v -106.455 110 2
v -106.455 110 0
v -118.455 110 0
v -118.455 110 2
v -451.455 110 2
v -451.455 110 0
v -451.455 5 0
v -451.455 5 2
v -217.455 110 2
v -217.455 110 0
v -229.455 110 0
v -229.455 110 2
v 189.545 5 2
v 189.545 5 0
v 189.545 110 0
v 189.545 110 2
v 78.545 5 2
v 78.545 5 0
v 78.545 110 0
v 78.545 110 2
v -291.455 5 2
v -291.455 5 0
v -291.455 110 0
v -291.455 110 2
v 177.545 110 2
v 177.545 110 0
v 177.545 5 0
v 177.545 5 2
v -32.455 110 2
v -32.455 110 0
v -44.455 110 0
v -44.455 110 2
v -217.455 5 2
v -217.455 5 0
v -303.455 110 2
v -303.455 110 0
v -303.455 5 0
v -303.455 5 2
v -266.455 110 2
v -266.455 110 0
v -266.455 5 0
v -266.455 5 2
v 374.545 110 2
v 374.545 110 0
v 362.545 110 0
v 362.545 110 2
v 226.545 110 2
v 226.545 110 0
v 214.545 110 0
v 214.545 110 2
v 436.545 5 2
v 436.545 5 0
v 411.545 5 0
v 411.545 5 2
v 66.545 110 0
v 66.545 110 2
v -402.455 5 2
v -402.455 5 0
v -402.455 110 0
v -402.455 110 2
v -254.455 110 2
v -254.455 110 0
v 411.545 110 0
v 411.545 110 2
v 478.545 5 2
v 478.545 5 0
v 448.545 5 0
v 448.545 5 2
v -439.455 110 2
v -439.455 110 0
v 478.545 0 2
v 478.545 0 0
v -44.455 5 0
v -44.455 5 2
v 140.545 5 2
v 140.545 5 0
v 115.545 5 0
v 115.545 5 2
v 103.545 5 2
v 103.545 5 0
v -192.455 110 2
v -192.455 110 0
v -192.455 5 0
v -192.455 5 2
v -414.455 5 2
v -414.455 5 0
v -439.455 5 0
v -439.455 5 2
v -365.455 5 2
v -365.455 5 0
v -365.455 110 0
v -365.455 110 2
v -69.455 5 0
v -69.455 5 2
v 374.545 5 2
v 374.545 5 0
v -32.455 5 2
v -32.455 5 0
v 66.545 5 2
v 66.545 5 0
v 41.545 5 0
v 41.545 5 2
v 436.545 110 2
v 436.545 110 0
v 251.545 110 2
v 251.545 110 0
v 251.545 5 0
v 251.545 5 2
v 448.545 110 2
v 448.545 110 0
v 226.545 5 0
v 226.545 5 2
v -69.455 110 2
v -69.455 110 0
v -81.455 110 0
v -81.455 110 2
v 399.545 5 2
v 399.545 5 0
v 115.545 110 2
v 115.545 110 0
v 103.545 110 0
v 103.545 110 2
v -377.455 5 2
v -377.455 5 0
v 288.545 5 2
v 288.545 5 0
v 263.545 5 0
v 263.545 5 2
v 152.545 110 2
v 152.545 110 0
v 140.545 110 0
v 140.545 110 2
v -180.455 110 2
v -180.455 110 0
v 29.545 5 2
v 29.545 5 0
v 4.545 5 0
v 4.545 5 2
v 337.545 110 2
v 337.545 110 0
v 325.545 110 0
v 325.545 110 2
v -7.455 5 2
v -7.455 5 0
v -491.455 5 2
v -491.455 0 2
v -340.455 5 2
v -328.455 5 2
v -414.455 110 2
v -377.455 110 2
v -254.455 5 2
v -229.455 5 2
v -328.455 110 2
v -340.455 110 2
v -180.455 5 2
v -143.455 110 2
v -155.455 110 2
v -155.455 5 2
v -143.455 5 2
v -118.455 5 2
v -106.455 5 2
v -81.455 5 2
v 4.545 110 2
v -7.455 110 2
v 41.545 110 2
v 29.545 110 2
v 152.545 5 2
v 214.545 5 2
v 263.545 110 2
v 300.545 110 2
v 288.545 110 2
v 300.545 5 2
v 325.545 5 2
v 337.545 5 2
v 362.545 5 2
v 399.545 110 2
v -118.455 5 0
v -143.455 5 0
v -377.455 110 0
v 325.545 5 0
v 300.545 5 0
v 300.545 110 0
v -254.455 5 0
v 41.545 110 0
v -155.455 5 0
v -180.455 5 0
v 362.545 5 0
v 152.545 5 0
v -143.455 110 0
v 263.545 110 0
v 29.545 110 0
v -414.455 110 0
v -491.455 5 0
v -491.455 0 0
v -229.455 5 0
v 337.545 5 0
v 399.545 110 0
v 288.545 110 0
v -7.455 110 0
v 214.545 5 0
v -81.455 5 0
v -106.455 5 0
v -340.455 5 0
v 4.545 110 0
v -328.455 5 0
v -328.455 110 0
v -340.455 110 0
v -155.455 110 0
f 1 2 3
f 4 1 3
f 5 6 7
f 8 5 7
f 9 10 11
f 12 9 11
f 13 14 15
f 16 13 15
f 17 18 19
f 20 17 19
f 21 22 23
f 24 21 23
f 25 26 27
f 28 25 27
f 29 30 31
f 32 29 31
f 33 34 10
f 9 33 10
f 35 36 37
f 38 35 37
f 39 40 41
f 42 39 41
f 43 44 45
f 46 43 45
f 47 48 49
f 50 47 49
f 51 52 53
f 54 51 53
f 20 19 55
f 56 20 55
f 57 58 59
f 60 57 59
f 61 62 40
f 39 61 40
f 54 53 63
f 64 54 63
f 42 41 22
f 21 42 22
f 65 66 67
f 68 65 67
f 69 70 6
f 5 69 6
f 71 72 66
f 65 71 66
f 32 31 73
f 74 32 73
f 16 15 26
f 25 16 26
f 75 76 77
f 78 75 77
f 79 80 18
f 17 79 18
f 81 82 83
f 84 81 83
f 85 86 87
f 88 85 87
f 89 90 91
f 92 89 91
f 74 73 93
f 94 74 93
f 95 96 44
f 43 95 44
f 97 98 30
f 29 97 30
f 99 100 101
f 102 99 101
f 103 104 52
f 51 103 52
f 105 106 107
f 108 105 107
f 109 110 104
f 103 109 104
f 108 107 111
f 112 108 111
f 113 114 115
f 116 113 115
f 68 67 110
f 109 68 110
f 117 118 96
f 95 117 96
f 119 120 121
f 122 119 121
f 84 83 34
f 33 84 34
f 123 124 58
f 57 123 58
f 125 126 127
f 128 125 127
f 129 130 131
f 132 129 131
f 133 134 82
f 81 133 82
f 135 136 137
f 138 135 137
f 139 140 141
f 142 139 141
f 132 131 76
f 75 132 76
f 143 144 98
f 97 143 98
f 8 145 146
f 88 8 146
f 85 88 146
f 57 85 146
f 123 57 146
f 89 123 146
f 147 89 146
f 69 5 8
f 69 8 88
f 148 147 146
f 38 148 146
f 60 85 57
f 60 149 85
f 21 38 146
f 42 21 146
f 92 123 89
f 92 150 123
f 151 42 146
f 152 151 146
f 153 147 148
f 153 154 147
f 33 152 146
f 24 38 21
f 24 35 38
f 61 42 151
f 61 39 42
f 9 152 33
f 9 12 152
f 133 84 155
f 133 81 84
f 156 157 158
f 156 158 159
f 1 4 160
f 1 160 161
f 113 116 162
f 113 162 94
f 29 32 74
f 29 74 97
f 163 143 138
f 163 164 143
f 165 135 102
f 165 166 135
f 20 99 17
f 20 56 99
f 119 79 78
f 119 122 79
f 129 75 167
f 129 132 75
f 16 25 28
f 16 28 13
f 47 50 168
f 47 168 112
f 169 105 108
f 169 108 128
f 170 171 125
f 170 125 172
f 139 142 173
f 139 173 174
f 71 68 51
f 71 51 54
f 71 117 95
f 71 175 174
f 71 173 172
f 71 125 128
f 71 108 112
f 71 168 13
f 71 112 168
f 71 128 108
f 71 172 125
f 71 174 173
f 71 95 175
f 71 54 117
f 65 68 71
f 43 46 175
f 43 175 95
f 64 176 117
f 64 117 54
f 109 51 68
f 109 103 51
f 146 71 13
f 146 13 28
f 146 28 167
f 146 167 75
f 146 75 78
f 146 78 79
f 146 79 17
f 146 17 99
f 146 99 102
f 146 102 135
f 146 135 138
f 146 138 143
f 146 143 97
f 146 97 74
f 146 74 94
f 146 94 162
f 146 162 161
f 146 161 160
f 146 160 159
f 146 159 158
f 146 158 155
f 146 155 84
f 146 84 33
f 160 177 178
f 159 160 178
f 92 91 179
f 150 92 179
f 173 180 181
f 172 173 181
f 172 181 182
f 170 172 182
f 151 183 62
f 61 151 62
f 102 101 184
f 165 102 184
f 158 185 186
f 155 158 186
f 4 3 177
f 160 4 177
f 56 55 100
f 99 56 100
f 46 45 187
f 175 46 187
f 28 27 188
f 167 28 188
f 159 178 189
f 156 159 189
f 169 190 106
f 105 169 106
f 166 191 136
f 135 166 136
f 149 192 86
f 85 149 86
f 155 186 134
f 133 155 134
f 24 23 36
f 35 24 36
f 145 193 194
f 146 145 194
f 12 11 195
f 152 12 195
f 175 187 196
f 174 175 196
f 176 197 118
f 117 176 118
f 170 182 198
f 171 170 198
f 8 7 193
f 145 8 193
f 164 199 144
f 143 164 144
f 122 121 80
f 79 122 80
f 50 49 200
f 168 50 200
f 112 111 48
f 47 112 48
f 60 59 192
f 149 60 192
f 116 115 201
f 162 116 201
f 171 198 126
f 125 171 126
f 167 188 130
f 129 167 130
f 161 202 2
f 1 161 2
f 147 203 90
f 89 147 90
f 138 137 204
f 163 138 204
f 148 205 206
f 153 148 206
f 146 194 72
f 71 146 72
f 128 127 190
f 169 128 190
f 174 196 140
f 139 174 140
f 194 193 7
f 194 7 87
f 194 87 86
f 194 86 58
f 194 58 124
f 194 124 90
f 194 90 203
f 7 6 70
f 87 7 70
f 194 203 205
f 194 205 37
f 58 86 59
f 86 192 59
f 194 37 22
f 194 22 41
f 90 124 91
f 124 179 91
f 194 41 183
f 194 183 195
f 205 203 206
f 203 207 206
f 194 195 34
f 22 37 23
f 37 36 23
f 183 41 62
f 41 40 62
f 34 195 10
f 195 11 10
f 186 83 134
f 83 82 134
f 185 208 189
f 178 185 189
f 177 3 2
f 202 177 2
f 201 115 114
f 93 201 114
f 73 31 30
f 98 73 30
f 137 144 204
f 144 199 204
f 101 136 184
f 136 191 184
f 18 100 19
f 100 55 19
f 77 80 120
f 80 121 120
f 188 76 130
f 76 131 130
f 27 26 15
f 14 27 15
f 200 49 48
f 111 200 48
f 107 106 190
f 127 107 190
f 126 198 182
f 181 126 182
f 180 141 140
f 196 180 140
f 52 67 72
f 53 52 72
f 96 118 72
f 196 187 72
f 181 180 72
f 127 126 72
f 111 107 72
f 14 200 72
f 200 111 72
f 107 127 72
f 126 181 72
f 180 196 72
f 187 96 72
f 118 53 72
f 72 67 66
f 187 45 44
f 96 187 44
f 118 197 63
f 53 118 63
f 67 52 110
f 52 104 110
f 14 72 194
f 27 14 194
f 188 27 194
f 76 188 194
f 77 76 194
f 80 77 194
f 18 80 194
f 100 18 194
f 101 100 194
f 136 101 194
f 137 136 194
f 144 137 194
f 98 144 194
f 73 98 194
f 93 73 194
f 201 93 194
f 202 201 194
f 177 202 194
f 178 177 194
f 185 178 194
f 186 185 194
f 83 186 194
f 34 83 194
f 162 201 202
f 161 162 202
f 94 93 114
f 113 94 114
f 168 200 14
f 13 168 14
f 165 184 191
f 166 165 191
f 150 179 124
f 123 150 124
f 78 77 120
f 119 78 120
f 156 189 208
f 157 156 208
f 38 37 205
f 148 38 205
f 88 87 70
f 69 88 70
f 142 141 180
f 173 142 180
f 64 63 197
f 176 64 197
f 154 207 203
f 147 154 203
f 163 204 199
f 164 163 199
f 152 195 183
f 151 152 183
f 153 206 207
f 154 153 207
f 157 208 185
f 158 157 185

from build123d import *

# Parameters (mm, degrees)
BOSS_EXTRUDE1_DEPTH = 2


with BuildPart() as part:
    # Sketch1 → Boss-Extrude1 (new body)
    with BuildSketch(Plane.XY):
        Polygon((-481.45546786, 0), (478.54453214, 0), (478.54453214, 5), (448.54453214, 5), (448.54453214, 110), (436.54453214, 110), (436.54453214, 5), (411.54453214, 5), (411.54453214, 110), (399.54453214, 110), (399.54453214, 5), (374.54453214, 5), (374.54453214, 110), (362.54453214, 110), (362.54453214, 5), (337.54453214, 5), (337.54453214, 110), (325.54453214, 110), (325.54453214, 5), (300.54453214, 5), (300.54453214, 110), (288.54453214, 110), (288.54453214, 5), (263.54453214, 5), (263.54453214, 110), (251.54453214, 110), (251.54453214, 5), (226.54453214, 5), (226.54453214, 110), (214.54453214, 110), (214.54453214, 5), (189.54453214, 5), (189.54453214, 110), (177.54453214, 110), (177.54453214, 5), (152.54453214, 5), (152.54453214, 110), (140.54453214, 110), (140.54453214, 5), (115.54453214, 5), (115.54453214, 110), (103.54453214, 110), (103.54453214, 5), (78.54453214, 5), (78.54453214, 110), (66.54453214, 110), (66.54453214, 5), (41.54453214, 5), (41.54453214, 110), (29.54453214, 110), (29.54453214, 5), (4.54453214, 5), (4.54453214, 110), (-7.45546786, 110), (-7.45546786, 5), (-32.45546786, 5), (-32.45546786, 110), (-44.45546786, 110), (-44.45546786, 5), (-69.45546786, 5), (-69.45546786, 110), (-81.45546786, 110), (-81.45546786, 5), (-106.45546786, 5), (-106.45546786, 110), (-118.45546786, 110), (-118.45546786, 5), (-143.45546786, 5), (-143.45546786, 110), (-155.45546786, 110), (-155.45546786, 5), (-180.45546786, 5), (-180.45546786, 110), (-192.45546786, 110), (-192.45546786, 5), (-217.45546786, 5), (-217.45546786, 110), (-229.45546786, 110), (-229.45546786, 5), (-254.45546786, 5), (-254.45546786, 110), (-266.45546786, 110), (-266.45546786, 5), (-291.45546786, 5), (-291.45546786, 110), (-303.45546786, 110), (-303.45546786, 5), (-328.45546786, 5), (-328.45546786, 110), (-340.45546786, 110), (-340.45546786, 5), (-365.45546786, 5), (-365.45546786, 110), (-377.45546786, 110), (-377.45546786, 5), (-402.45546786, 5), (-402.45546786, 110), (-414.45546786, 110), (-414.45546786, 5), (-439.45546786, 5), (-439.45546786, 110), (-451.45546786, 110), (-451.45546786, 5), (-491.45546786, 5), (-491.45546786, 0), align=None)
    extrude(amount=BOSS_EXTRUDE1_DEPTH)


solid = part.part
